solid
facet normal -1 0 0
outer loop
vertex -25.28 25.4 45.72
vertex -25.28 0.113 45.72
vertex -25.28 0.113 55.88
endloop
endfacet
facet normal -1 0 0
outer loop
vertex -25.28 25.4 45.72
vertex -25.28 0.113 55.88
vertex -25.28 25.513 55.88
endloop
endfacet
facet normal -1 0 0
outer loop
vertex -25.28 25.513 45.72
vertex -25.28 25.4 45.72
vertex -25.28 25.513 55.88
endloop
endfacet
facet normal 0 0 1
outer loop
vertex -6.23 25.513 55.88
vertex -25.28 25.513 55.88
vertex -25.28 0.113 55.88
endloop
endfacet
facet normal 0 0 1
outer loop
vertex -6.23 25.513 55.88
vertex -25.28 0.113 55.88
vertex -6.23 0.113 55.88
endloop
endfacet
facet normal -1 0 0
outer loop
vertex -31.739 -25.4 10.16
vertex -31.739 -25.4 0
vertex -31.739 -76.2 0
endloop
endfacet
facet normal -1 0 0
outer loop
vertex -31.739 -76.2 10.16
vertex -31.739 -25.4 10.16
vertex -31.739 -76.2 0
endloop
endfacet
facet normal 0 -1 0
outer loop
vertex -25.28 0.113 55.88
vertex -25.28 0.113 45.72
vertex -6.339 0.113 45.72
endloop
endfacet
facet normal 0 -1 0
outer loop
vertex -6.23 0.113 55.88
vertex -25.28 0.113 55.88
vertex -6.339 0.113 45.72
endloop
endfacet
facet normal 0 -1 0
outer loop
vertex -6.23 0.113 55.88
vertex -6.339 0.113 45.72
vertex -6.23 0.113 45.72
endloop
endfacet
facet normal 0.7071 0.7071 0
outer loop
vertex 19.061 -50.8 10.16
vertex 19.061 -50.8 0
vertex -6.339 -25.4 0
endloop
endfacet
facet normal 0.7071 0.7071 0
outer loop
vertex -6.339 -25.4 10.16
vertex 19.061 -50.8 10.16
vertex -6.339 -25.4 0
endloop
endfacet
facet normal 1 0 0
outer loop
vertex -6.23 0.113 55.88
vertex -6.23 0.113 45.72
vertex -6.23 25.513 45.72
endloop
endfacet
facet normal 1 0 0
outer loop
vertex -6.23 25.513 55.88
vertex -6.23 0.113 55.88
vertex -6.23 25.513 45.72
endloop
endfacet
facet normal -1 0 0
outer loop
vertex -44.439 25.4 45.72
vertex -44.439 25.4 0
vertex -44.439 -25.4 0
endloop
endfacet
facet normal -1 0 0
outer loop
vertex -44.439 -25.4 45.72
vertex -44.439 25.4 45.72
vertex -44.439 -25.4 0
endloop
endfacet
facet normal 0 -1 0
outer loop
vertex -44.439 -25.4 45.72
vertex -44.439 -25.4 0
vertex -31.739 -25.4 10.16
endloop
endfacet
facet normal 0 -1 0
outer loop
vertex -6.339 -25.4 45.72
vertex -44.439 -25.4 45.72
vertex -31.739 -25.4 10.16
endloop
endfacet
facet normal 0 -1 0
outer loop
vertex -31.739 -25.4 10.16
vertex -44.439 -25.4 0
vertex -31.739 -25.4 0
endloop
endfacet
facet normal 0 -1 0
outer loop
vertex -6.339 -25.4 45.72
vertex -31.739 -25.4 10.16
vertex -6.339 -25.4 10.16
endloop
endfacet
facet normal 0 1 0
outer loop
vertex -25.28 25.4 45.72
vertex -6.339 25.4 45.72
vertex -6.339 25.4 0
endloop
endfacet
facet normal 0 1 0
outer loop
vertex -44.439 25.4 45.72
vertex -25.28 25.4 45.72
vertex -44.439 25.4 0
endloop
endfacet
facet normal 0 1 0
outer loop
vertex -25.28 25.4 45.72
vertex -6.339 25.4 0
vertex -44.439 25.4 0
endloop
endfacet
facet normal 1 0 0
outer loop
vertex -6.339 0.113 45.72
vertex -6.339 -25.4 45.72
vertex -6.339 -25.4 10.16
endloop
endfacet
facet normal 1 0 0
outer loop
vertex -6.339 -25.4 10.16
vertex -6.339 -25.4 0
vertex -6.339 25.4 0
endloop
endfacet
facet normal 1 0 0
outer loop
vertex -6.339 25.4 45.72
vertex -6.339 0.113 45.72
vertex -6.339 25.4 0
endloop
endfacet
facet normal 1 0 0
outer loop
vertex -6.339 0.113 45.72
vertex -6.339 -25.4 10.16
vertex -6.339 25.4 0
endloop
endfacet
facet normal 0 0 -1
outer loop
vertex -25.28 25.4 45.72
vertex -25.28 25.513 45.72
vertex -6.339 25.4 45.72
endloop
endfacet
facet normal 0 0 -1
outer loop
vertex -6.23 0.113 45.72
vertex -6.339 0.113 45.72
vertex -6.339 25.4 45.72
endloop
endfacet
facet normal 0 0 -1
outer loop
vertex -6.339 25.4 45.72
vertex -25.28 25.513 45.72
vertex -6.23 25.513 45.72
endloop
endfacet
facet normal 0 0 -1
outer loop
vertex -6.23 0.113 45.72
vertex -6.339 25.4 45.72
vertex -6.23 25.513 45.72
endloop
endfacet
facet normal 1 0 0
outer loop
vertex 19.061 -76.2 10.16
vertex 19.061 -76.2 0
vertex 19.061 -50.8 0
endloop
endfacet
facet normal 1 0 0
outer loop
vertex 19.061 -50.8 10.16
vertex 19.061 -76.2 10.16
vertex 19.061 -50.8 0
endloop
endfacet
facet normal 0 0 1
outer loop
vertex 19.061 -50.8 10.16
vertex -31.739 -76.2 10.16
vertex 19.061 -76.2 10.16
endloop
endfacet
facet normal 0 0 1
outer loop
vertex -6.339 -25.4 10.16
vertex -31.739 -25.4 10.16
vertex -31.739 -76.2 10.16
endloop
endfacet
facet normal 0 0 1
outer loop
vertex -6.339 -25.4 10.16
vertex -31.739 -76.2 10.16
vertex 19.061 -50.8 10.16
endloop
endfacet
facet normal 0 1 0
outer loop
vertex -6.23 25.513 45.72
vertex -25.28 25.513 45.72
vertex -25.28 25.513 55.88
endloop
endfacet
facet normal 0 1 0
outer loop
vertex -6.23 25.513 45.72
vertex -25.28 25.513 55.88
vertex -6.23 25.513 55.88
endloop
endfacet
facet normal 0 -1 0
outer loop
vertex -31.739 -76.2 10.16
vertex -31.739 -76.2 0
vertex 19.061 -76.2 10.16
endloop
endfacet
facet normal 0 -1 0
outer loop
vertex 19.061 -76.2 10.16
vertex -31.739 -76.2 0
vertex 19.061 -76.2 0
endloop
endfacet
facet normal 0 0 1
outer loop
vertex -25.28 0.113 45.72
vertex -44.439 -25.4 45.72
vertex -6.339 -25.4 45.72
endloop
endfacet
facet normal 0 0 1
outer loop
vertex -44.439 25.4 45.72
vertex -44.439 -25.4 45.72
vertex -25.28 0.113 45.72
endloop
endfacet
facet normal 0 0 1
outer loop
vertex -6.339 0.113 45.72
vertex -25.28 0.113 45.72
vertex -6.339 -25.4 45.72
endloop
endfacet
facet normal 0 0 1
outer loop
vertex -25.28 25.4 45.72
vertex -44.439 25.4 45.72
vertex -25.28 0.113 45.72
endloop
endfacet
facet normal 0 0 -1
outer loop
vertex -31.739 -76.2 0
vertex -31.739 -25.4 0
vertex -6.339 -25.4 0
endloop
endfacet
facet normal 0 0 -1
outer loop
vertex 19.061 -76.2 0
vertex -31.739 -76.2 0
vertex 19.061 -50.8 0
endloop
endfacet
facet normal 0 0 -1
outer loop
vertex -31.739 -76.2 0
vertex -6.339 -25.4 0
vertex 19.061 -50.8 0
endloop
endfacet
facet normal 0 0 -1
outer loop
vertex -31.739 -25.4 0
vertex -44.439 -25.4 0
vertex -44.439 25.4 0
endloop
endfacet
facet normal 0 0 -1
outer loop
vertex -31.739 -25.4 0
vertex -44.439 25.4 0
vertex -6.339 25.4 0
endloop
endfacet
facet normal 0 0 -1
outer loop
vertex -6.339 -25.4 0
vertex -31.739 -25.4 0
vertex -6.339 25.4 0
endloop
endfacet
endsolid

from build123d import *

# Parameters (mm, degrees)
F1_DEPTH = 45.72
F2_DEPTH = 10.16
F4_W     = 19.05
F4_H     = 25.4
F5_DEPTH = 10.16


with BuildPart() as f1:
    # F0 (on Top) → F1 (new body)
    with BuildSketch(Plane.XY):
        Polygon((-6.338918, 25.4), (-44.438918, 25.4), (-44.438918, -25.4), (-31.738918, -25.4), (-6.338918, -25.4), align=None)
    extrude(amount=F1_DEPTH)

    # F0 (on Top) → F2 (join)
    with BuildSketch(Plane.XY):
        Polygon((19.061082, -50.8), (-6.338918, -25.4), (-31.738918, -25.4), (-31.738918, -76.2), (19.061082, -76.2), align=None)
    extrude(amount=F2_DEPTH)

    # F4 (on offset) → F5 (join)
    with BuildSketch(Plane.XY.offset(45.72)):
        with Locations((-15.755231, 12.81299)):
            Rectangle(F4_W, F4_H)
    extrude(amount=F5_DEPTH)


solid = f1.part
